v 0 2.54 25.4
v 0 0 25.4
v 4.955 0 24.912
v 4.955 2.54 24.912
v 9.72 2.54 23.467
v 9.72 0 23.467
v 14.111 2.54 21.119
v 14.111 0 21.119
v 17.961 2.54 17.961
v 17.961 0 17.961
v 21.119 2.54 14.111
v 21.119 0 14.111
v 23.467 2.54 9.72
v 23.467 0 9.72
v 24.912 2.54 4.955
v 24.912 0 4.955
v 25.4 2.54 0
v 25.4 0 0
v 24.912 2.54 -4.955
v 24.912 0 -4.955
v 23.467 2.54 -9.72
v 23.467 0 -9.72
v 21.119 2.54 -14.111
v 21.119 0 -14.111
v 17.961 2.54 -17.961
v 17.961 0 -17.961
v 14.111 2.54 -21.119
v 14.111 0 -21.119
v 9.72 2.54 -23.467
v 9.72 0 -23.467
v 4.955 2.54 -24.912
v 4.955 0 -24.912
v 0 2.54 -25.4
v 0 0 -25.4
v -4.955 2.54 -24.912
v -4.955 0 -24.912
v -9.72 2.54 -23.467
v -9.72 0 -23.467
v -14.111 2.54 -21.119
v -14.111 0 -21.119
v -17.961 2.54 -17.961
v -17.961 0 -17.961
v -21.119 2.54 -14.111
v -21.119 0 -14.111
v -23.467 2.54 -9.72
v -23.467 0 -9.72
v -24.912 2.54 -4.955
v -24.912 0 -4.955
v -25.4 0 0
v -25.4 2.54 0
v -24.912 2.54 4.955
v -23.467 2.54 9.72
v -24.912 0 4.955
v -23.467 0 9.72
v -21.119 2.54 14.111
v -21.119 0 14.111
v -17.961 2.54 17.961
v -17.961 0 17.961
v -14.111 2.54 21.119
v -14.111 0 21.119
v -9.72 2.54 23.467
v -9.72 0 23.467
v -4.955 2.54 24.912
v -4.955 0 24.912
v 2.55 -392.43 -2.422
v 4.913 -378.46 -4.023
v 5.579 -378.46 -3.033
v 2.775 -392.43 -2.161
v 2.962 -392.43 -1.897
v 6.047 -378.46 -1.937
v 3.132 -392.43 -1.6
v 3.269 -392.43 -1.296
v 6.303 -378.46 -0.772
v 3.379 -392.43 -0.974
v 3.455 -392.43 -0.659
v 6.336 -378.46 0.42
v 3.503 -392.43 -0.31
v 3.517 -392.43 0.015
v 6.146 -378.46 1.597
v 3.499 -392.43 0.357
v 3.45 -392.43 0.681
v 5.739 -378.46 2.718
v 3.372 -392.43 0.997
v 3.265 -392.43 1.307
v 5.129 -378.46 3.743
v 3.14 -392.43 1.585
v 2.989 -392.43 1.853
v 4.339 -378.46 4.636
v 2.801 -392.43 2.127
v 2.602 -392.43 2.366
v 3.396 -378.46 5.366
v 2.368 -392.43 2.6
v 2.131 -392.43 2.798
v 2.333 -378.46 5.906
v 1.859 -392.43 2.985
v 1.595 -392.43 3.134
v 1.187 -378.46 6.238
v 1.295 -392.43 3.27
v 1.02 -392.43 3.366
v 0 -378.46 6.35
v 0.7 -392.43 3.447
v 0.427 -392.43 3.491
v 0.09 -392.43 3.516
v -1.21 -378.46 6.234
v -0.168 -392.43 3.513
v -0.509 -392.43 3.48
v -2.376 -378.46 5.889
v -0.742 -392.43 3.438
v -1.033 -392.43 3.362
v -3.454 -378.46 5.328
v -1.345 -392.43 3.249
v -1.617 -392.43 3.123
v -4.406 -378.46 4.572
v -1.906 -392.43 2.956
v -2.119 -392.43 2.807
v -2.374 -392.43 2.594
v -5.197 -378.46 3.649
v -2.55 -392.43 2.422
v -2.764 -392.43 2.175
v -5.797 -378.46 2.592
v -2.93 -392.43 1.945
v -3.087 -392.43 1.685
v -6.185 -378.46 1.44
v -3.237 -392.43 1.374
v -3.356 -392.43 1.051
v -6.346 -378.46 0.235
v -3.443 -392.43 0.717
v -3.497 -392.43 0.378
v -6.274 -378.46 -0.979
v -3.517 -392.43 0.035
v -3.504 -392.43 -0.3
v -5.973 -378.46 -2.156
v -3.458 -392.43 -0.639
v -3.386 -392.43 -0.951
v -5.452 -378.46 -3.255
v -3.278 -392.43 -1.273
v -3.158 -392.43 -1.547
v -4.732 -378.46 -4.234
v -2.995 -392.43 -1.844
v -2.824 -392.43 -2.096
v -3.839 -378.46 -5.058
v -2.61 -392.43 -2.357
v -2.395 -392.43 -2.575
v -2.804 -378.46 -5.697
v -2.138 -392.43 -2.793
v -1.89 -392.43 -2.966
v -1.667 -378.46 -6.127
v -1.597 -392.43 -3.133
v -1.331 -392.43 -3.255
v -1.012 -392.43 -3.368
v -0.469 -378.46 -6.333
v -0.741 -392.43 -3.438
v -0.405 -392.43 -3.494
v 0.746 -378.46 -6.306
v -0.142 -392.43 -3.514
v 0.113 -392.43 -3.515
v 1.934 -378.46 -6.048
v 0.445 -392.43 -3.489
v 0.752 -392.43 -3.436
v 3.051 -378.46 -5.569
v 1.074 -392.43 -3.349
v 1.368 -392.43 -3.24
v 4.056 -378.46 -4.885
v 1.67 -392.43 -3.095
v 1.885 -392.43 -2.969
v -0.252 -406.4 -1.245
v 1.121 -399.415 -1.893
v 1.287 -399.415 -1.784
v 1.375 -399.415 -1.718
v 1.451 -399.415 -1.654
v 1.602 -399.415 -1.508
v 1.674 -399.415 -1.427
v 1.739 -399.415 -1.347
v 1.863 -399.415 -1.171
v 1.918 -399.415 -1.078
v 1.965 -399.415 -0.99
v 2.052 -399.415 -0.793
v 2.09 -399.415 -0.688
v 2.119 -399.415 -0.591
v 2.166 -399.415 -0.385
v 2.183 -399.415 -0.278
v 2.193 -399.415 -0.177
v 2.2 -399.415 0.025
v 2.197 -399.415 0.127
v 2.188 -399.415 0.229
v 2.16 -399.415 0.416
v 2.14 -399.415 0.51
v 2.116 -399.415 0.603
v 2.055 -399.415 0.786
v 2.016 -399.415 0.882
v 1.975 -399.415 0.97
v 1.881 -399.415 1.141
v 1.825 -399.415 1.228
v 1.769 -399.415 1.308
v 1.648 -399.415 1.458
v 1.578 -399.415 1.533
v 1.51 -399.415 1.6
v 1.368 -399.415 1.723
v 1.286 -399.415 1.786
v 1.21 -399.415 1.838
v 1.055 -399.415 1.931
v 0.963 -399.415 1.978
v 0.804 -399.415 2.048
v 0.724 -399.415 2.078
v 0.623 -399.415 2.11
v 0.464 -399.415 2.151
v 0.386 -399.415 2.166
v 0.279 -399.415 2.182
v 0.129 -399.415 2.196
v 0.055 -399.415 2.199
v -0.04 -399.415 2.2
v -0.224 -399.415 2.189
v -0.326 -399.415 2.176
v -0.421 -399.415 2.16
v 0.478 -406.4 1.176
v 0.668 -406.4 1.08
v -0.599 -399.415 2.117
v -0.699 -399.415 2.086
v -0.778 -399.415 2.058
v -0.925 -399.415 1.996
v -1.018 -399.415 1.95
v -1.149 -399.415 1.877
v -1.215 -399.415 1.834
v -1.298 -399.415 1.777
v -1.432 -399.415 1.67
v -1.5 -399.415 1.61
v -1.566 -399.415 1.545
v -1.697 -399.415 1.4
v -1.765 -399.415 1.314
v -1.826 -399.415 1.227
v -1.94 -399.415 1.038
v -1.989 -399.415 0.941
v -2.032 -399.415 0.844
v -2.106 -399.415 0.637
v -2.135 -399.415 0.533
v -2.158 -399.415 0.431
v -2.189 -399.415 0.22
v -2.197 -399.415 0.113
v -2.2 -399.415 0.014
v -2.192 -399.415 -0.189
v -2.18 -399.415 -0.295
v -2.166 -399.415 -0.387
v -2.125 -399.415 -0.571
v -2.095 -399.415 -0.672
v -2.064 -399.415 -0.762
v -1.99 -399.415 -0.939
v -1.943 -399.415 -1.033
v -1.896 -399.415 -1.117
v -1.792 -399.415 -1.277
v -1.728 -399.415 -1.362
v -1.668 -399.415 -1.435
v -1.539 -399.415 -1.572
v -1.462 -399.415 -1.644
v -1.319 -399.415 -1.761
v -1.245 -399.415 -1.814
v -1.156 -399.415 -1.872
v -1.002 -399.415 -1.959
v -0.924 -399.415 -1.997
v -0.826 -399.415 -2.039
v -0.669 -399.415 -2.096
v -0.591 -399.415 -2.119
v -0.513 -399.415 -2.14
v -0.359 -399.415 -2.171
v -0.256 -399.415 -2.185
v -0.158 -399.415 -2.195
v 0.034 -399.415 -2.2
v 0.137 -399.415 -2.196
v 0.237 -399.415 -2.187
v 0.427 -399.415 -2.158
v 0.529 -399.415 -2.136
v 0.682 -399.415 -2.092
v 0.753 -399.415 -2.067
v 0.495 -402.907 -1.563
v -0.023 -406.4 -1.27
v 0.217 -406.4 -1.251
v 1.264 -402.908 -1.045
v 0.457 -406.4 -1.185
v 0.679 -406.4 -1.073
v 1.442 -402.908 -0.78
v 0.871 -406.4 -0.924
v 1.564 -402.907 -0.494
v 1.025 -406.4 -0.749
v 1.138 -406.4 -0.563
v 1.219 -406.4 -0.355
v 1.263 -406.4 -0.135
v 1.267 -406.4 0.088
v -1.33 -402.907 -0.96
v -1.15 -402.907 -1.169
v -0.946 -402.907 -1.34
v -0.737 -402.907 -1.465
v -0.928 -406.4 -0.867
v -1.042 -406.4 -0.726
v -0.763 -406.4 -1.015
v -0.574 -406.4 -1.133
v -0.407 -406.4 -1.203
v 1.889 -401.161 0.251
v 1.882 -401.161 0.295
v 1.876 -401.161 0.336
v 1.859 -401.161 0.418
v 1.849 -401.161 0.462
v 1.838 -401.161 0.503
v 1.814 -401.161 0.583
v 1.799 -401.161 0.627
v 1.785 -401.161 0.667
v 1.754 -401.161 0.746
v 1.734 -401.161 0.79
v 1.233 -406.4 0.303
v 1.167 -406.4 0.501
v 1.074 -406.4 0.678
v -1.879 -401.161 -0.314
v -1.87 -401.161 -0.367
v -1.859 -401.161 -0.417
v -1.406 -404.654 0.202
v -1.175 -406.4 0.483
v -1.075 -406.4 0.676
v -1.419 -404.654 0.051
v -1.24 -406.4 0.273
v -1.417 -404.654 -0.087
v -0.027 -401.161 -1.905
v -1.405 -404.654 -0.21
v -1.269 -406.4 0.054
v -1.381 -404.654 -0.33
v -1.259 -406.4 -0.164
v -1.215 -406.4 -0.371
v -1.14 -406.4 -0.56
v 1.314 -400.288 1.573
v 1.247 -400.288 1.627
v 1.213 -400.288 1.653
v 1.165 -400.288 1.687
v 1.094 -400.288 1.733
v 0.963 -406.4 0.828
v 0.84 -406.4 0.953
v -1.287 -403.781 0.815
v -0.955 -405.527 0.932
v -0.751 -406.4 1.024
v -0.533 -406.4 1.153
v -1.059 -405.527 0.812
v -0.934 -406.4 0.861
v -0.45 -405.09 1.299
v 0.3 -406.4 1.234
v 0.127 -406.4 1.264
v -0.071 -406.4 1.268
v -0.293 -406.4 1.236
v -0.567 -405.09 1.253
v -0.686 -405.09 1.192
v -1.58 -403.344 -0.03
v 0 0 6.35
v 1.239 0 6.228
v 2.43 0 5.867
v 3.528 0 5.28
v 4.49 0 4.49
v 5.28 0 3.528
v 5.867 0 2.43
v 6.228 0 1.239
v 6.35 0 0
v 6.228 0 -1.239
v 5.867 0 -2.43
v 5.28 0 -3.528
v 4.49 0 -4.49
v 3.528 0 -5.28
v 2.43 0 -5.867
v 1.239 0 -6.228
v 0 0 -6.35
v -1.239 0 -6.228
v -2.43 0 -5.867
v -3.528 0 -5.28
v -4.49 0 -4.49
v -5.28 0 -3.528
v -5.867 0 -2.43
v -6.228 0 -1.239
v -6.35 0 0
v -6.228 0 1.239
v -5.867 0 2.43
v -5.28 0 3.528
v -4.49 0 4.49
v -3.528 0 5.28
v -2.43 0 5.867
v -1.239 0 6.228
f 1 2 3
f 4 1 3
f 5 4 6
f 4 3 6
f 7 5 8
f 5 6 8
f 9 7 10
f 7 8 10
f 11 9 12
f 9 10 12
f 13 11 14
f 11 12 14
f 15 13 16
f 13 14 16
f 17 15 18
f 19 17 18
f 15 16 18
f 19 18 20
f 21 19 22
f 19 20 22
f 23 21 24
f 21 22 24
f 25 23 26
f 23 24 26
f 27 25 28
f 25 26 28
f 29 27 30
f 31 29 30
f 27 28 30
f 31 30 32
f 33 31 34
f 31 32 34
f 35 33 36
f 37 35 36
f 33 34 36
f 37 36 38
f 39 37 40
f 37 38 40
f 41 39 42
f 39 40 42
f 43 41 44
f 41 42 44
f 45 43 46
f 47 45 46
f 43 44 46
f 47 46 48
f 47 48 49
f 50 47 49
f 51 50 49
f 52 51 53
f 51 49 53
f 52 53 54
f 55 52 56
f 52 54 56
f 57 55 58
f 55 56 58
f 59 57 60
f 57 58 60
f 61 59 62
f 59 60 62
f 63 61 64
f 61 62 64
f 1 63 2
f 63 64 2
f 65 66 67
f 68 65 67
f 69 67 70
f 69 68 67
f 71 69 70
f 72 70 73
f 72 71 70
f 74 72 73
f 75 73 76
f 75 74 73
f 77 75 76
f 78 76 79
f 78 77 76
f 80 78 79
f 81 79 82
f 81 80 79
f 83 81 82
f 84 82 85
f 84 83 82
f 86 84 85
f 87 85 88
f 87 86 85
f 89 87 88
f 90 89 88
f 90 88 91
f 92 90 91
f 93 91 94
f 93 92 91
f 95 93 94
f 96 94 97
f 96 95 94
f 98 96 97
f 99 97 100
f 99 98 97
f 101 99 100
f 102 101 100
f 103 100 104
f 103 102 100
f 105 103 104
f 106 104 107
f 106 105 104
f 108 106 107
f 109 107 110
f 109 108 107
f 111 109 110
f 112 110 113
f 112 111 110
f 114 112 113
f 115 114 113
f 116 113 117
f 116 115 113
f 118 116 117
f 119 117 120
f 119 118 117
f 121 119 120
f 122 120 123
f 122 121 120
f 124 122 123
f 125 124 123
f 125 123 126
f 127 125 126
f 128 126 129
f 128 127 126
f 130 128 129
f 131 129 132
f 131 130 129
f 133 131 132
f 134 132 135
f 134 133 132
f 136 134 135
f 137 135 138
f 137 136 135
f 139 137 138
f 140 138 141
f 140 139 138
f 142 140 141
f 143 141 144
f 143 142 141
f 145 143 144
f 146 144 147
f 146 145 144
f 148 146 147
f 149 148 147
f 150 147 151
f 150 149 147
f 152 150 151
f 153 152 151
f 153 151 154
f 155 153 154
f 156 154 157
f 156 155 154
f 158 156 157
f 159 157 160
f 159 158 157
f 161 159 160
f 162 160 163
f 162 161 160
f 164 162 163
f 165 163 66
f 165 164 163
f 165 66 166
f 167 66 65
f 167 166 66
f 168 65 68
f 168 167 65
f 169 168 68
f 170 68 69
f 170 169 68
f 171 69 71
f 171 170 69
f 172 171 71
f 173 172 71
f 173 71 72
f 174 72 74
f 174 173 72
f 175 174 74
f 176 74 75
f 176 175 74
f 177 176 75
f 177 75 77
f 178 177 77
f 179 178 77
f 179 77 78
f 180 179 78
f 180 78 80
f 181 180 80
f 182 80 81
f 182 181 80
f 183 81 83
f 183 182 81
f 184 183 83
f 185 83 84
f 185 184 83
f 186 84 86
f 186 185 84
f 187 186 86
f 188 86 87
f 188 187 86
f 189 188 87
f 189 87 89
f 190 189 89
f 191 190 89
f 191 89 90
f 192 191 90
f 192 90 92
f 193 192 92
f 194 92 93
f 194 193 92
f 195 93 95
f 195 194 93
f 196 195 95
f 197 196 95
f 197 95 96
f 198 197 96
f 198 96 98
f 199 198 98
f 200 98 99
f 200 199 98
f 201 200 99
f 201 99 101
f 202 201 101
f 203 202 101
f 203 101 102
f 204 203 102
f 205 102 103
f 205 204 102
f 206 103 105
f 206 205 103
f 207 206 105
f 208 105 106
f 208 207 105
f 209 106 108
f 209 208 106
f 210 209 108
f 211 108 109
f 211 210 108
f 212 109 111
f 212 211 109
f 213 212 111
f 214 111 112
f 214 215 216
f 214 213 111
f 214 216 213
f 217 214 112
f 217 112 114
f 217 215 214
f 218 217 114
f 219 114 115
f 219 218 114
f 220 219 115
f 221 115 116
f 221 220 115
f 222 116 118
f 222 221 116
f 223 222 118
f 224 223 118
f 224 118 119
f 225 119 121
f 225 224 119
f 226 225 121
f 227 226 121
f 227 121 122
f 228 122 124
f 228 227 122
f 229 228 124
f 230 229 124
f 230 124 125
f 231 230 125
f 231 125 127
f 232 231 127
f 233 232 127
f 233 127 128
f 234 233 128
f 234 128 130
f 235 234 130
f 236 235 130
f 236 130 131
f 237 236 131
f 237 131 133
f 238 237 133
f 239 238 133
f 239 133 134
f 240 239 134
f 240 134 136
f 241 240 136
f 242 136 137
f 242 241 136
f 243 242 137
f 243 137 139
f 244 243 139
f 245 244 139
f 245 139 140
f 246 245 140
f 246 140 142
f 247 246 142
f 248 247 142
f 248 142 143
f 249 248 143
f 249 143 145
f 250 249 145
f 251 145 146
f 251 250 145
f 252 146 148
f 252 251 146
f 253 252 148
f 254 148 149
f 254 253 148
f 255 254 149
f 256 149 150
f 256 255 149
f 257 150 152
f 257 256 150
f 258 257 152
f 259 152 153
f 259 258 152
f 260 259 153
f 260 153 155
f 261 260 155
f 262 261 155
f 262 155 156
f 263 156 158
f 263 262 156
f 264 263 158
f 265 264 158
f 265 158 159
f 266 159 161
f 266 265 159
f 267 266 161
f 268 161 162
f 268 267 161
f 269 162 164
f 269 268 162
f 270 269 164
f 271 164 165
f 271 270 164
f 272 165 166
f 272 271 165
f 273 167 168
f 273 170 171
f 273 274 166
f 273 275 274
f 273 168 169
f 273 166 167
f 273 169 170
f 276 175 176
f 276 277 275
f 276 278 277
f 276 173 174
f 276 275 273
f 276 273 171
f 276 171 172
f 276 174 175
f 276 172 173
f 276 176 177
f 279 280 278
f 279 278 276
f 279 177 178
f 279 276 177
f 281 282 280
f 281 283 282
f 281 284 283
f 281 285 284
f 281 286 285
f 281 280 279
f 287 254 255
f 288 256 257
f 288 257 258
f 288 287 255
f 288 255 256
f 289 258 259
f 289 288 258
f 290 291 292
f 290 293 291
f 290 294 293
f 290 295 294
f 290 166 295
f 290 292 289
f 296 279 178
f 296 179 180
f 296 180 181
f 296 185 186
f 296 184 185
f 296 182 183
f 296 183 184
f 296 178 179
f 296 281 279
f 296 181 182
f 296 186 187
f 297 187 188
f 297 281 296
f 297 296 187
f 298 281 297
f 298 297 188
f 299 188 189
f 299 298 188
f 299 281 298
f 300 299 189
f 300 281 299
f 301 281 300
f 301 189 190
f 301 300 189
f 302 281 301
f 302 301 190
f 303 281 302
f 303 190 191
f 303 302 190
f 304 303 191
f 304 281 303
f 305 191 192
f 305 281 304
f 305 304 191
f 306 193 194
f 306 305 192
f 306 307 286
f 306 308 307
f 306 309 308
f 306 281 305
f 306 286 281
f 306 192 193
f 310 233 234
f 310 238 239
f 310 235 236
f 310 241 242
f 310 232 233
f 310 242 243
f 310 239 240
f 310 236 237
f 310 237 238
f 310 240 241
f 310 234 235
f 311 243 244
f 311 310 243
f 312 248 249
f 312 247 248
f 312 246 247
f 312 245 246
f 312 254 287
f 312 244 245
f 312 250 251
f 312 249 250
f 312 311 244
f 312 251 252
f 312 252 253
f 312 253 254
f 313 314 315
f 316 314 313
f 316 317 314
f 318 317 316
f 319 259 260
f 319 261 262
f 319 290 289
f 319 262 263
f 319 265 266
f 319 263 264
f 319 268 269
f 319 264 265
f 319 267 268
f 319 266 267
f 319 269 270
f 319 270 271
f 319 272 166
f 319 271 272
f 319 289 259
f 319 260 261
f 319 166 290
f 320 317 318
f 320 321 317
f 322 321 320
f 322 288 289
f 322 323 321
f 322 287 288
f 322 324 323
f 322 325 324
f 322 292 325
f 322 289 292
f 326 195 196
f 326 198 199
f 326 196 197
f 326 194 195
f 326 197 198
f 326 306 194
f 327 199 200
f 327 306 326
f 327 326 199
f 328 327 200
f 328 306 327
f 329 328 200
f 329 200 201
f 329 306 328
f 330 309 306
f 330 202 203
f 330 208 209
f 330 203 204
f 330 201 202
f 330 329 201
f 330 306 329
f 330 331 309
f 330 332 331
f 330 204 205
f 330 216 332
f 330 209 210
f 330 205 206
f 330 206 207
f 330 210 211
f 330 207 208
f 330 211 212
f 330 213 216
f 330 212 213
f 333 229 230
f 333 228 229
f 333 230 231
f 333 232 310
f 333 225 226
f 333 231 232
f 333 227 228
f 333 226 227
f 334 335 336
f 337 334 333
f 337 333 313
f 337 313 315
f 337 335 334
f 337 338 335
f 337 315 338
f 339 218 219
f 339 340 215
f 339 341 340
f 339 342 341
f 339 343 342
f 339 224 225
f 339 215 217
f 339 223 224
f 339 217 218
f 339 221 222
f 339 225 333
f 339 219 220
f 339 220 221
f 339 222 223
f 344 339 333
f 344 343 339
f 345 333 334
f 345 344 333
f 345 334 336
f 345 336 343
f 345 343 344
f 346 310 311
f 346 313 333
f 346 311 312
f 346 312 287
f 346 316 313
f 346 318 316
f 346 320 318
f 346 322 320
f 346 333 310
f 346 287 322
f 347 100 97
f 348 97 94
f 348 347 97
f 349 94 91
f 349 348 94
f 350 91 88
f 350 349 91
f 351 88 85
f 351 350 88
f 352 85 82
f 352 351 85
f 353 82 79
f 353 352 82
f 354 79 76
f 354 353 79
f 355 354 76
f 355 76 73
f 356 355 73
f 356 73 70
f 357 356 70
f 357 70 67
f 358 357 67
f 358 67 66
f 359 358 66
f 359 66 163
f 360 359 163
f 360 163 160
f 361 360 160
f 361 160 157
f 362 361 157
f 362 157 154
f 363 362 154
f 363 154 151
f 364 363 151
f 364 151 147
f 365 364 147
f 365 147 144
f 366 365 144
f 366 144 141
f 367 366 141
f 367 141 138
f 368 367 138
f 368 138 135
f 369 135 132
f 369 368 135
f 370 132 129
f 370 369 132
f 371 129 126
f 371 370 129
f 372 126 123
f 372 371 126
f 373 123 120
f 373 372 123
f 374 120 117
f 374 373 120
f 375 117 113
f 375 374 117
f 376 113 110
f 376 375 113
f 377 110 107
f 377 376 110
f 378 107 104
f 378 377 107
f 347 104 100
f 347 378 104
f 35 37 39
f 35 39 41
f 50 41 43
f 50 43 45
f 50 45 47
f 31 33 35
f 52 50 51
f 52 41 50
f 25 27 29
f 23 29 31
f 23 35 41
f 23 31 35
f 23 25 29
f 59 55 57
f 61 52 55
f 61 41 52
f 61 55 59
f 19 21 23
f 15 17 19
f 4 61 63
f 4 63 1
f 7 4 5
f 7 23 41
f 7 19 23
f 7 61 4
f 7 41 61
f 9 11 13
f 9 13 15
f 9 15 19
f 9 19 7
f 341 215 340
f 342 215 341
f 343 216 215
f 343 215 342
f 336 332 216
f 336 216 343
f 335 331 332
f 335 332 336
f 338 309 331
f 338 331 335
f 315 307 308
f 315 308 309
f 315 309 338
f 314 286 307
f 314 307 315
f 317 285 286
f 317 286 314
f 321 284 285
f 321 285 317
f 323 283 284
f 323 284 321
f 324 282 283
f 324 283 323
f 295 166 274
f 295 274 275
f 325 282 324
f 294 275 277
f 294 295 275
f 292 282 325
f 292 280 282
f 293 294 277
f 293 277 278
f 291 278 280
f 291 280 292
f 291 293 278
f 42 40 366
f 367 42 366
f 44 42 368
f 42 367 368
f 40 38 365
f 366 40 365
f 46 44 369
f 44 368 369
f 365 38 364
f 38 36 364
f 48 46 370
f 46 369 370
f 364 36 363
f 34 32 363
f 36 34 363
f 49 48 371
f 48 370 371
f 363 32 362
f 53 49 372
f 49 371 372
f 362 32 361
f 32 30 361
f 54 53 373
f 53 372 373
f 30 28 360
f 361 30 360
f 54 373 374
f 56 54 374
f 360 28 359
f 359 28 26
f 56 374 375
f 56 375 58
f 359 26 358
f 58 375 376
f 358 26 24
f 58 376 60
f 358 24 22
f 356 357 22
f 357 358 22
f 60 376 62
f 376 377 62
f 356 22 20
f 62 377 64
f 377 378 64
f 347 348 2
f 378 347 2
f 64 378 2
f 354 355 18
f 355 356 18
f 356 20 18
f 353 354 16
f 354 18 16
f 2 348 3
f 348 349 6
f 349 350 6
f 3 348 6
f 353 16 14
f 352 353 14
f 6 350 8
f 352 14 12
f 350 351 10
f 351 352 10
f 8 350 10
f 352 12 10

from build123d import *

# Parameters (mm, degrees)
SKETCH1_R           = 25.4
BOSS_EXTRUDE1_DEPTH = 2.54
SKETCH2_R           = 6.35
BOSS_EXTRUDE2_DEPTH = 381


with BuildPart() as part:
    # Sketch1 → Boss-Extrude1 (new body)
    with BuildSketch(Plane(origin=(0, 0, 0), x_dir=(1, 0, 0), z_dir=(0, 1, 0))):
        with Locations(Location((0, 0, 0), (0, 0, 270))):
            Circle(SKETCH1_R)
    extrude(amount=BOSS_EXTRUDE1_DEPTH)

    # Sketch2 → Boss-Extrude2 (add)
    with BuildSketch(Plane(origin=(0, 2.54, 0), x_dir=(1, 0, 0), z_dir=(0, 1, 0))):
        with Locations(Location((0, 0, 0), (0, 0, 270))):
            Circle(SKETCH2_R)
    extrude(amount=-BOSS_EXTRUDE2_DEPTH)

    # Loft1: read off the stored shape, not the designer's step
    # Loft1: loft between two sections, ruled curve by curve
    loft1_from = [
        Edge.make_bspline([(4.913042865, -378.46, -4.022997615), (12.959038094, -378.46, 5.803088115), (3.132952365, -378.46, 13.849083344), (-4.913042865, -378.46, 4.022997615), (-12.959038094, -378.46, -5.803088115), (-3.132952365, -378.46, -13.849083344), (4.913042865, -378.46, -4.022997615)], [0, 0, 0, 0, 0.5, 0.5, 0.5, 1, 1, 1, 1], 3, [1, 0.333333333, 0.333333333, 1, 0.333333333, 0.333333333, 1]),
    ]
    loft1_to = [
        Edge.make_bspline([(-0.252067696, -406.4, -1.244733657), (2.237399617, -406.4, -1.748869049), (2.74153501, -406.4, 0.740598264), (0.252067696, -406.4, 1.244733657), (-2.237399617, -406.4, 1.748869049), (-2.74153501, -406.4, -0.740598264), (-0.252067696, -406.4, -1.244733657)], [0, 0, 0, 0, 0.5, 0.5, 0.5, 1, 1, 1, 1], 3, [1, 0.333333333, 0.333333333, 1, 0.333333333, 0.333333333, 1]),
    ]
    loft1 = Solid(Shell([*[Face.make_surface_from_curves(loft1_from[k], loft1_to[k]) for k in range(1)], Face(Wire(loft1_from)), Face(Wire(loft1_to))]))
    add(loft1)


solid = part.part
